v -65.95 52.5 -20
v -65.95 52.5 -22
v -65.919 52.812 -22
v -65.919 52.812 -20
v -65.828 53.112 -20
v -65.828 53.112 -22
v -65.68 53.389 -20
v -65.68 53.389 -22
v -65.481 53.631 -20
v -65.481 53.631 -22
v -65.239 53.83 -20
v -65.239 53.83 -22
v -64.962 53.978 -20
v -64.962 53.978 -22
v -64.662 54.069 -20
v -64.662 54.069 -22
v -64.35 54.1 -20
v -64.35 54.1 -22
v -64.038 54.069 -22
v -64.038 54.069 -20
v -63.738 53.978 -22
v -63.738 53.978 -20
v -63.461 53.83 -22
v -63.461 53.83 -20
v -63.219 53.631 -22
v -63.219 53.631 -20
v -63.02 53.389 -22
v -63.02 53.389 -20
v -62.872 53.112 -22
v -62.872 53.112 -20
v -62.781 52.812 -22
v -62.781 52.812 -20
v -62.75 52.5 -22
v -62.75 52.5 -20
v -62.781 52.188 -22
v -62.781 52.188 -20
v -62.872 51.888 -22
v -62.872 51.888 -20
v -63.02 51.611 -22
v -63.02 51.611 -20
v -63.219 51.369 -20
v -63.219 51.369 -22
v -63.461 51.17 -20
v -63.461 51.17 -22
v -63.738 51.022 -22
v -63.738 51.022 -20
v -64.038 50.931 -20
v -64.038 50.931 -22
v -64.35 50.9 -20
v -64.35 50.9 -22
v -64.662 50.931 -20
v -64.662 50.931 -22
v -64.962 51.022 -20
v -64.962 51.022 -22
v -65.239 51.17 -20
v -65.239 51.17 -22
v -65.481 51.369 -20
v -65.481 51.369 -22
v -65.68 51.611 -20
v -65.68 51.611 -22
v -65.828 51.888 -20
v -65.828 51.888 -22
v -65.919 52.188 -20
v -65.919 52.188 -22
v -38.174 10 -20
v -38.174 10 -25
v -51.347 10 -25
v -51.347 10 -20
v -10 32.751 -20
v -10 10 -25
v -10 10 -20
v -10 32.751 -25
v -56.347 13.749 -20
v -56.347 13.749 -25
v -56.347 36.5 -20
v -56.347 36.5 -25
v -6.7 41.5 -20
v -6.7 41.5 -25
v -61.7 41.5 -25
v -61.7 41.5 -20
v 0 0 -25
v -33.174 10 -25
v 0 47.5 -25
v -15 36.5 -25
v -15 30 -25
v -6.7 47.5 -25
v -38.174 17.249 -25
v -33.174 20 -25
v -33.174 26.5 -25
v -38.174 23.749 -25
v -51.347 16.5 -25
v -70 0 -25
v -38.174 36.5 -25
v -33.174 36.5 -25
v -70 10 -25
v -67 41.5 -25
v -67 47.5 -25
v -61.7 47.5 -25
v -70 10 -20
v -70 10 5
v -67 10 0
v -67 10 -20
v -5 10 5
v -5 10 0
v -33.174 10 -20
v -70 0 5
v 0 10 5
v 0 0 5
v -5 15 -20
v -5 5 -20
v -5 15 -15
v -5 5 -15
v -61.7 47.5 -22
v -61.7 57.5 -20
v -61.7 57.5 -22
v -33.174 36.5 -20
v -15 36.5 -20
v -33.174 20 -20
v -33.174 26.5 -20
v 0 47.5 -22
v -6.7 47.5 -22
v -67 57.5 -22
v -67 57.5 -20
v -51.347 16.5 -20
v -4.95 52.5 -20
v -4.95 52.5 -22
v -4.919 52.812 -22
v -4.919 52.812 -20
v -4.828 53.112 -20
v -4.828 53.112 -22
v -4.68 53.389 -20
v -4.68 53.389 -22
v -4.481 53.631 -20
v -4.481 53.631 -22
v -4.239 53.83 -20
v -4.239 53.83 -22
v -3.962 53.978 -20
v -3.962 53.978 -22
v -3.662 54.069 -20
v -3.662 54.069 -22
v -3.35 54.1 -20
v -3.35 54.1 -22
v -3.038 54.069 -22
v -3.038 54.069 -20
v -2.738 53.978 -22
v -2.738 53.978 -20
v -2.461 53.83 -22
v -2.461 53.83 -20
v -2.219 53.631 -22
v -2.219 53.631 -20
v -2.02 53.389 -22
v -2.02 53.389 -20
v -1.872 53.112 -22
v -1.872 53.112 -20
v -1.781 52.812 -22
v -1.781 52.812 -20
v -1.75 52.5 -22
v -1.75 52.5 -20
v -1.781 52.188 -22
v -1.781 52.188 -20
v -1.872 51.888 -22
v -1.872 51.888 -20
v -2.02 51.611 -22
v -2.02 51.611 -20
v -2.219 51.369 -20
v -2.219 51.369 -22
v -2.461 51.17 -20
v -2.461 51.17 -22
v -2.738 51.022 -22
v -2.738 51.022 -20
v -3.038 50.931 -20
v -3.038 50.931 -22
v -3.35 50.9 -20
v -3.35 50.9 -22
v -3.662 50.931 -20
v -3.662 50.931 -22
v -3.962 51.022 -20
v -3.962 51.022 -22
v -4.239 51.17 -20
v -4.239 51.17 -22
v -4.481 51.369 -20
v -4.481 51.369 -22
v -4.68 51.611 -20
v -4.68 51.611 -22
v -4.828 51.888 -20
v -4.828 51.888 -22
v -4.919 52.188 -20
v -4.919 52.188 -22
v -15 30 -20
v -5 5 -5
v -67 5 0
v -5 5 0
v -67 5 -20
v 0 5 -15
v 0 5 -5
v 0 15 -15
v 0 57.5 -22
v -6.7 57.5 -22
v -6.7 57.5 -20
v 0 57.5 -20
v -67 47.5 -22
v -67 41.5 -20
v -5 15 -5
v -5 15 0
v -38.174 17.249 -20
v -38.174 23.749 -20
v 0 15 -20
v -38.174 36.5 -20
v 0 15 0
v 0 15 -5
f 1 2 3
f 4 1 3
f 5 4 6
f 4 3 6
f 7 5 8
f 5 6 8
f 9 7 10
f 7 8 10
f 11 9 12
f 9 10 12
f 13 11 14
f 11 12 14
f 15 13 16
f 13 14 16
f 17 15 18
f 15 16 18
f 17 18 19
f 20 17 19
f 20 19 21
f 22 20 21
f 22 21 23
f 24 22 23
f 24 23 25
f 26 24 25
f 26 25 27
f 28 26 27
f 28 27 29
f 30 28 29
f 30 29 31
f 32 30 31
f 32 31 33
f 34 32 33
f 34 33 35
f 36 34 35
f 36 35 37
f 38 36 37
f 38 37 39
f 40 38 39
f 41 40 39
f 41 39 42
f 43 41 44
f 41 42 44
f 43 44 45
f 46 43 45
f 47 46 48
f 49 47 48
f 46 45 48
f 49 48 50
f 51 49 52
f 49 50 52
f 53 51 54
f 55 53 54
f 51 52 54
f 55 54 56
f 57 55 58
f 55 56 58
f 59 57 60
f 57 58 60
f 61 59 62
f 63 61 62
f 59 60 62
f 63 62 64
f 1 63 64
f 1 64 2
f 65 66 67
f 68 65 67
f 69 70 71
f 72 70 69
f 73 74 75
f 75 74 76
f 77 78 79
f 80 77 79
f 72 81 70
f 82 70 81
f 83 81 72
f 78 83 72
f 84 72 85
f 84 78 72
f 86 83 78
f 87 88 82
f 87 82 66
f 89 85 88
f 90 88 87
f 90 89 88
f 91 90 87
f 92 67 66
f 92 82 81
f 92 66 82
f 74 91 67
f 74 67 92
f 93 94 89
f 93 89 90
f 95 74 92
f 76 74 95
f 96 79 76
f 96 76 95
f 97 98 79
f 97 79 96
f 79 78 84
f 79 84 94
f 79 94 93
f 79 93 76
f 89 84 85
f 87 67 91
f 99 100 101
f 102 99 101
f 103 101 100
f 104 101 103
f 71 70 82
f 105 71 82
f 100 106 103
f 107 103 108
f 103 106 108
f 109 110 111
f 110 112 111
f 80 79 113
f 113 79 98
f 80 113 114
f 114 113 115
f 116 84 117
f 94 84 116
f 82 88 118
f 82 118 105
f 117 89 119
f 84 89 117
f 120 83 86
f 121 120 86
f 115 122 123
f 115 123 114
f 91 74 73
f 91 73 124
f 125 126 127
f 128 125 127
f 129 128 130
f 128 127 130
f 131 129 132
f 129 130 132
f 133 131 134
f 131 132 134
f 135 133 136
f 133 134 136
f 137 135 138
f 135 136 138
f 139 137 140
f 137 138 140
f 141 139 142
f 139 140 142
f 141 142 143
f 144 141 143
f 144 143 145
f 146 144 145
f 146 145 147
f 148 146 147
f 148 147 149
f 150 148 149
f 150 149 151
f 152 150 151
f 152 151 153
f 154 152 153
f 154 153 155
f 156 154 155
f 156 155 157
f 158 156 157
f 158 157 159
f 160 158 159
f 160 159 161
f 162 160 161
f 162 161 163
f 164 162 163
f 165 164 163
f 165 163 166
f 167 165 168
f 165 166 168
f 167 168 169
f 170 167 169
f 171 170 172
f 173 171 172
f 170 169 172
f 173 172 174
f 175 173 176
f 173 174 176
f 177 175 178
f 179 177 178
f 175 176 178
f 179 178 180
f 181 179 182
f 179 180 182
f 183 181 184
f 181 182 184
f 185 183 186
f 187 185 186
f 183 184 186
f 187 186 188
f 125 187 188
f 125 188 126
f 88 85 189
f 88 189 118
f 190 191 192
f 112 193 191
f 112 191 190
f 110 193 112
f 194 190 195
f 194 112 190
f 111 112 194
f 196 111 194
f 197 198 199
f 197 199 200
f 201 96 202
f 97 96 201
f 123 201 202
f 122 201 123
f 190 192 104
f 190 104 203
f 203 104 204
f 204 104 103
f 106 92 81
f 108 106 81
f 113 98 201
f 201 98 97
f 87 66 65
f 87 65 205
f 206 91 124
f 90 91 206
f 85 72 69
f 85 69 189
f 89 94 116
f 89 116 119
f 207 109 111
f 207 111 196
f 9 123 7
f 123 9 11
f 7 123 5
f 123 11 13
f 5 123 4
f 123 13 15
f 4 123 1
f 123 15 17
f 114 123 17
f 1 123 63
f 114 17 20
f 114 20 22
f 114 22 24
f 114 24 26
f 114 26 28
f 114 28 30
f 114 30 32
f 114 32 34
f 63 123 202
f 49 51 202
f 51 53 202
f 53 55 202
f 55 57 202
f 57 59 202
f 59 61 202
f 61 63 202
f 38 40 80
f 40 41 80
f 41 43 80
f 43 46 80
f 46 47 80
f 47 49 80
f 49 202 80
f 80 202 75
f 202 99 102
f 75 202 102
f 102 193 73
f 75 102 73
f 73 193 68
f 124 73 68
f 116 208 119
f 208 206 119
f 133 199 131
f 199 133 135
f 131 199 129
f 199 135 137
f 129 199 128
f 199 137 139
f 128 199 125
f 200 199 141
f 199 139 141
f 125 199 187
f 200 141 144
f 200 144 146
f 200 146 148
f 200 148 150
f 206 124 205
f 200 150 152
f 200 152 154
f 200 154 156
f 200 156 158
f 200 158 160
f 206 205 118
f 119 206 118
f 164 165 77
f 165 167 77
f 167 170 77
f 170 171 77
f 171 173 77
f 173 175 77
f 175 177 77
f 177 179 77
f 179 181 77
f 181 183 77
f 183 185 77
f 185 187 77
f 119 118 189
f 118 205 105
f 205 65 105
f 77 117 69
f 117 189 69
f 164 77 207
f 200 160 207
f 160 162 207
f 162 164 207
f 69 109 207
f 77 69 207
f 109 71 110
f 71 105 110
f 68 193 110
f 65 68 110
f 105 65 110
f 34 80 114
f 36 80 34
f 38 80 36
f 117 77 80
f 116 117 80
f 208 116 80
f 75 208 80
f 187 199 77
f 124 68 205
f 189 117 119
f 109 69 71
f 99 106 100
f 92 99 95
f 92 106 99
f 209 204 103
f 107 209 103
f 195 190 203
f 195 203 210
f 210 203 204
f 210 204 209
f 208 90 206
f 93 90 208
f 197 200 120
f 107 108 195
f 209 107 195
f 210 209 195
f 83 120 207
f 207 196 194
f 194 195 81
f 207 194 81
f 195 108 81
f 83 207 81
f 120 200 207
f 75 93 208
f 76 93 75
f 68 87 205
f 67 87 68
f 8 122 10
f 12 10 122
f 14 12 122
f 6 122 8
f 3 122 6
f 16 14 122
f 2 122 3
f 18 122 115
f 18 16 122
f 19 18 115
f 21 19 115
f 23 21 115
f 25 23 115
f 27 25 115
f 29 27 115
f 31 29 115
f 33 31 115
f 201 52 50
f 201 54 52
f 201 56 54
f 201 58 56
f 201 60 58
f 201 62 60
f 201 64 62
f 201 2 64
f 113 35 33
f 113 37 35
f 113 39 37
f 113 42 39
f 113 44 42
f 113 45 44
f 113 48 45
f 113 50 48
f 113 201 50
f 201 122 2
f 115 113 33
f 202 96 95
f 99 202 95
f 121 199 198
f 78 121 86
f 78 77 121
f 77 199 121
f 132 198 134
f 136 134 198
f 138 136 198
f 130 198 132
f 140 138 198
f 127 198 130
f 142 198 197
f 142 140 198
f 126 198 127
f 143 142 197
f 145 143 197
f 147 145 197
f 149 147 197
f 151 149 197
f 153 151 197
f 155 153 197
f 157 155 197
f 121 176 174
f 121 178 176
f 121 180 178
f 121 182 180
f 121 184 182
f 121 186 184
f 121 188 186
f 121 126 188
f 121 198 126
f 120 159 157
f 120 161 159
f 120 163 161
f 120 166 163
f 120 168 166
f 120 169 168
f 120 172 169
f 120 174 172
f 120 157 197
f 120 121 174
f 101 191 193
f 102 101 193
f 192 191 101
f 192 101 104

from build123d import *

# Parameters (mm, degrees)
SKETCH2_W            = 70
SKETCH2_H            = 20
BOSS_EXTRUDE1_DEPTH  = 5
SKETCH3_W            = 70
SKETCH3_H            = 5
BOSS_EXTRUDE2_DEPTH  = 10
SKETCH4_W            = 5
SKETCH4_H            = 5
BOSS_EXTRUDE3_DEPTH  = 10
LOFT1_START          = -5
LOFT1_DEPTH          = 5
SKETCH7_W            = 3
SKETCH7_H            = 20
BOSS_EXTRUDE4_DEPTH  = 5
LOFT2_START          = -5
LOFT2_DEPTH          = 5
BOSS_EXTRUDE5_DEPTH  = 5
SKETCH12_W           = 46.347010245
SKETCH12_H           = 26.5
CUT_EXTRUDE1_DEPTH   = 14
BOSS_EXTRUDE6_DEPTH  = 5
BOSS_EXTRUDE7_DEPTH  = 5
SKETCH17_W           = 6.7
SKETCH17_H           = 6
BOSS_EXTRUDE8_DEPTH  = 5
SKETCH18_W           = 5.3
SKETCH18_H           = 6
BOSS_EXTRUDE9_DEPTH  = 5
SKETCH23_W           = 6.7
SKETCH23_H           = 2
SKETCH23_W_2         = 5.3
BOSS_EXTRUDE12_DEPTH = 10
SKETCH24_R           = 1.6
CUT_EXTRUDE4_DEPTH   = 10


# Read off the part's stored shape, not the designer's step: Loft1, Loft2
with BuildPart() as part:
    # Sketch2 → Boss-Extrude1 (new body)
    with BuildSketch(Plane(origin=(0, 0, 0), x_dir=(1, 0, 0), z_dir=(0, 1, 0))):
        with Locations((-35, 10)):
            Rectangle(SKETCH2_W, SKETCH2_H)
    extrude(amount=BOSS_EXTRUDE1_DEPTH)

    # Sketch3 → Boss-Extrude2 (add)
    with BuildSketch(Plane(origin=(0, 0, 0), x_dir=(1, 0, 0), z_dir=(0, 1, 0))):
        with Locations((-35, 22.5)):
            Rectangle(SKETCH3_W, SKETCH3_H)
        with Locations((-35, -2.5)):
            Rectangle(SKETCH3_W, SKETCH3_H)
    extrude(amount=BOSS_EXTRUDE2_DEPTH)

    # Sketch4 → Boss-Extrude3 (add)
    with BuildSketch(Plane(origin=(0, 5, 0), x_dir=(1, 0, 0), z_dir=(0, 1, 0))):
        with Locations((-2.5, 2.5)):
            Rectangle(SKETCH4_W, SKETCH4_H)
        with Locations((-2.5, 17.5)):
            Rectangle(SKETCH4_W, SKETCH4_H)
    extrude(amount=BOSS_EXTRUDE3_DEPTH)

    # Loft1 outline → Loft1 (add)
    with BuildSketch(Plane.YZ.offset(LOFT1_START)):
        Polygon((15, 0), (10, 5), (10, 0), align=None)
    extrude(amount=LOFT1_DEPTH)

    # Sketch7 → Boss-Extrude4 (add)
    with BuildSketch(Plane(origin=(0, 5, 0), x_dir=(1, 0, 0), z_dir=(0, 1, 0))):
        with Locations((-68.5, 10)):
            Rectangle(SKETCH7_W, SKETCH7_H)
    extrude(amount=BOSS_EXTRUDE4_DEPTH)

    # Loft2 outline → Loft2 (add)
    with BuildSketch(Plane.YZ.offset(LOFT2_START)):
        Polygon((10, -25), (15, -20), (10, -20), align=None)
    extrude(amount=LOFT2_DEPTH)

    # Sketch10 → Boss-Extrude5 (add)
    with BuildSketch(Plane(origin=(0, 0, -25), x_dir=(-1, 0, 0), z_dir=(0, 0, -1))):
        Polygon((0, 10), (0, 41.5), (67, 41.5), (70, 10), align=None)
    extrude(amount=-BOSS_EXTRUDE5_DEPTH)

    # Sketch12 → Cut-Extrude1 (cut)
    with BuildSketch(Plane(origin=(0, 0, -25), x_dir=(-1, 0, 0), z_dir=(0, 0, -1))):
        with Locations((33.173505123, 23.25)):
            Rectangle(SKETCH12_W, SKETCH12_H)
    extrude(amount=-CUT_EXTRUDE1_DEPTH, mode=Mode.SUBTRACT)

    # Sketch13 → Boss-Extrude6 (add)
    with BuildSketch(Plane(origin=(0, 0, -25), x_dir=(-1, 0, 0), z_dir=(0, 0, -1))):
        Polygon((15, 30), (51.347010245, 10), (56.347010245, 10), (56.347010245, 13.748742075), (51.347010245, 16.5), (15, 36.5), (10, 36.5), (10, 32.751257925), align=None)
    extrude(amount=-BOSS_EXTRUDE6_DEPTH)

    # Sketch14 → Boss-Extrude7 (add)
    with BuildSketch(Plane(origin=(0, 0, -25), x_dir=(-1, 0, 0), z_dir=(0, 0, -1))):
        Polygon((35.673505122, 36.5), (33.173505122, 36.5), (33.173505122, 10), (38.173505122, 10), (38.173505122, 36.5), align=None)
    extrude(amount=-BOSS_EXTRUDE7_DEPTH)

    # Sketch17 → Boss-Extrude8 (add)
    with BuildSketch(Plane(origin=(0, 0, -25), x_dir=(-1, 0, 0), z_dir=(0, 0, -1))):
        with Locations((3.35, 44.5)):
            Rectangle(SKETCH17_W, SKETCH17_H)
    extrude(amount=-BOSS_EXTRUDE8_DEPTH)

    # Sketch18 → Boss-Extrude9 (add)
    with BuildSketch(Plane(origin=(0, 0, -25), x_dir=(-1, 0, 0), z_dir=(0, 0, -1))):
        with Locations((64.35, 44.5)):
            Rectangle(SKETCH18_W, SKETCH18_H)
    extrude(amount=-BOSS_EXTRUDE9_DEPTH)

    # Sketch23 → Boss-Extrude12 (add)
    with BuildSketch(Plane(origin=(0, 47.5, 0), x_dir=(1, 0, 0), z_dir=(0, 1, 0))):
        with Locations((-3.35, 21)):
            Rectangle(SKETCH23_W, SKETCH23_H)
        with Locations((-64.35, 21)):
            Rectangle(SKETCH23_W_2, SKETCH23_H)
    extrude(amount=BOSS_EXTRUDE12_DEPTH)

    # Sketch24 → Cut-Extrude4 (cut)
    with BuildSketch(Plane(origin=(0, 0, -22), x_dir=(-1, 0, 0), z_dir=(0, 0, -1))):
        with Locations((3.35, 52.5)):
            Circle(SKETCH24_R)
        with Locations((64.35, 52.5)):
            Circle(SKETCH24_R)
    extrude(amount=-CUT_EXTRUDE4_DEPTH, mode=Mode.SUBTRACT)


solid = part.part
